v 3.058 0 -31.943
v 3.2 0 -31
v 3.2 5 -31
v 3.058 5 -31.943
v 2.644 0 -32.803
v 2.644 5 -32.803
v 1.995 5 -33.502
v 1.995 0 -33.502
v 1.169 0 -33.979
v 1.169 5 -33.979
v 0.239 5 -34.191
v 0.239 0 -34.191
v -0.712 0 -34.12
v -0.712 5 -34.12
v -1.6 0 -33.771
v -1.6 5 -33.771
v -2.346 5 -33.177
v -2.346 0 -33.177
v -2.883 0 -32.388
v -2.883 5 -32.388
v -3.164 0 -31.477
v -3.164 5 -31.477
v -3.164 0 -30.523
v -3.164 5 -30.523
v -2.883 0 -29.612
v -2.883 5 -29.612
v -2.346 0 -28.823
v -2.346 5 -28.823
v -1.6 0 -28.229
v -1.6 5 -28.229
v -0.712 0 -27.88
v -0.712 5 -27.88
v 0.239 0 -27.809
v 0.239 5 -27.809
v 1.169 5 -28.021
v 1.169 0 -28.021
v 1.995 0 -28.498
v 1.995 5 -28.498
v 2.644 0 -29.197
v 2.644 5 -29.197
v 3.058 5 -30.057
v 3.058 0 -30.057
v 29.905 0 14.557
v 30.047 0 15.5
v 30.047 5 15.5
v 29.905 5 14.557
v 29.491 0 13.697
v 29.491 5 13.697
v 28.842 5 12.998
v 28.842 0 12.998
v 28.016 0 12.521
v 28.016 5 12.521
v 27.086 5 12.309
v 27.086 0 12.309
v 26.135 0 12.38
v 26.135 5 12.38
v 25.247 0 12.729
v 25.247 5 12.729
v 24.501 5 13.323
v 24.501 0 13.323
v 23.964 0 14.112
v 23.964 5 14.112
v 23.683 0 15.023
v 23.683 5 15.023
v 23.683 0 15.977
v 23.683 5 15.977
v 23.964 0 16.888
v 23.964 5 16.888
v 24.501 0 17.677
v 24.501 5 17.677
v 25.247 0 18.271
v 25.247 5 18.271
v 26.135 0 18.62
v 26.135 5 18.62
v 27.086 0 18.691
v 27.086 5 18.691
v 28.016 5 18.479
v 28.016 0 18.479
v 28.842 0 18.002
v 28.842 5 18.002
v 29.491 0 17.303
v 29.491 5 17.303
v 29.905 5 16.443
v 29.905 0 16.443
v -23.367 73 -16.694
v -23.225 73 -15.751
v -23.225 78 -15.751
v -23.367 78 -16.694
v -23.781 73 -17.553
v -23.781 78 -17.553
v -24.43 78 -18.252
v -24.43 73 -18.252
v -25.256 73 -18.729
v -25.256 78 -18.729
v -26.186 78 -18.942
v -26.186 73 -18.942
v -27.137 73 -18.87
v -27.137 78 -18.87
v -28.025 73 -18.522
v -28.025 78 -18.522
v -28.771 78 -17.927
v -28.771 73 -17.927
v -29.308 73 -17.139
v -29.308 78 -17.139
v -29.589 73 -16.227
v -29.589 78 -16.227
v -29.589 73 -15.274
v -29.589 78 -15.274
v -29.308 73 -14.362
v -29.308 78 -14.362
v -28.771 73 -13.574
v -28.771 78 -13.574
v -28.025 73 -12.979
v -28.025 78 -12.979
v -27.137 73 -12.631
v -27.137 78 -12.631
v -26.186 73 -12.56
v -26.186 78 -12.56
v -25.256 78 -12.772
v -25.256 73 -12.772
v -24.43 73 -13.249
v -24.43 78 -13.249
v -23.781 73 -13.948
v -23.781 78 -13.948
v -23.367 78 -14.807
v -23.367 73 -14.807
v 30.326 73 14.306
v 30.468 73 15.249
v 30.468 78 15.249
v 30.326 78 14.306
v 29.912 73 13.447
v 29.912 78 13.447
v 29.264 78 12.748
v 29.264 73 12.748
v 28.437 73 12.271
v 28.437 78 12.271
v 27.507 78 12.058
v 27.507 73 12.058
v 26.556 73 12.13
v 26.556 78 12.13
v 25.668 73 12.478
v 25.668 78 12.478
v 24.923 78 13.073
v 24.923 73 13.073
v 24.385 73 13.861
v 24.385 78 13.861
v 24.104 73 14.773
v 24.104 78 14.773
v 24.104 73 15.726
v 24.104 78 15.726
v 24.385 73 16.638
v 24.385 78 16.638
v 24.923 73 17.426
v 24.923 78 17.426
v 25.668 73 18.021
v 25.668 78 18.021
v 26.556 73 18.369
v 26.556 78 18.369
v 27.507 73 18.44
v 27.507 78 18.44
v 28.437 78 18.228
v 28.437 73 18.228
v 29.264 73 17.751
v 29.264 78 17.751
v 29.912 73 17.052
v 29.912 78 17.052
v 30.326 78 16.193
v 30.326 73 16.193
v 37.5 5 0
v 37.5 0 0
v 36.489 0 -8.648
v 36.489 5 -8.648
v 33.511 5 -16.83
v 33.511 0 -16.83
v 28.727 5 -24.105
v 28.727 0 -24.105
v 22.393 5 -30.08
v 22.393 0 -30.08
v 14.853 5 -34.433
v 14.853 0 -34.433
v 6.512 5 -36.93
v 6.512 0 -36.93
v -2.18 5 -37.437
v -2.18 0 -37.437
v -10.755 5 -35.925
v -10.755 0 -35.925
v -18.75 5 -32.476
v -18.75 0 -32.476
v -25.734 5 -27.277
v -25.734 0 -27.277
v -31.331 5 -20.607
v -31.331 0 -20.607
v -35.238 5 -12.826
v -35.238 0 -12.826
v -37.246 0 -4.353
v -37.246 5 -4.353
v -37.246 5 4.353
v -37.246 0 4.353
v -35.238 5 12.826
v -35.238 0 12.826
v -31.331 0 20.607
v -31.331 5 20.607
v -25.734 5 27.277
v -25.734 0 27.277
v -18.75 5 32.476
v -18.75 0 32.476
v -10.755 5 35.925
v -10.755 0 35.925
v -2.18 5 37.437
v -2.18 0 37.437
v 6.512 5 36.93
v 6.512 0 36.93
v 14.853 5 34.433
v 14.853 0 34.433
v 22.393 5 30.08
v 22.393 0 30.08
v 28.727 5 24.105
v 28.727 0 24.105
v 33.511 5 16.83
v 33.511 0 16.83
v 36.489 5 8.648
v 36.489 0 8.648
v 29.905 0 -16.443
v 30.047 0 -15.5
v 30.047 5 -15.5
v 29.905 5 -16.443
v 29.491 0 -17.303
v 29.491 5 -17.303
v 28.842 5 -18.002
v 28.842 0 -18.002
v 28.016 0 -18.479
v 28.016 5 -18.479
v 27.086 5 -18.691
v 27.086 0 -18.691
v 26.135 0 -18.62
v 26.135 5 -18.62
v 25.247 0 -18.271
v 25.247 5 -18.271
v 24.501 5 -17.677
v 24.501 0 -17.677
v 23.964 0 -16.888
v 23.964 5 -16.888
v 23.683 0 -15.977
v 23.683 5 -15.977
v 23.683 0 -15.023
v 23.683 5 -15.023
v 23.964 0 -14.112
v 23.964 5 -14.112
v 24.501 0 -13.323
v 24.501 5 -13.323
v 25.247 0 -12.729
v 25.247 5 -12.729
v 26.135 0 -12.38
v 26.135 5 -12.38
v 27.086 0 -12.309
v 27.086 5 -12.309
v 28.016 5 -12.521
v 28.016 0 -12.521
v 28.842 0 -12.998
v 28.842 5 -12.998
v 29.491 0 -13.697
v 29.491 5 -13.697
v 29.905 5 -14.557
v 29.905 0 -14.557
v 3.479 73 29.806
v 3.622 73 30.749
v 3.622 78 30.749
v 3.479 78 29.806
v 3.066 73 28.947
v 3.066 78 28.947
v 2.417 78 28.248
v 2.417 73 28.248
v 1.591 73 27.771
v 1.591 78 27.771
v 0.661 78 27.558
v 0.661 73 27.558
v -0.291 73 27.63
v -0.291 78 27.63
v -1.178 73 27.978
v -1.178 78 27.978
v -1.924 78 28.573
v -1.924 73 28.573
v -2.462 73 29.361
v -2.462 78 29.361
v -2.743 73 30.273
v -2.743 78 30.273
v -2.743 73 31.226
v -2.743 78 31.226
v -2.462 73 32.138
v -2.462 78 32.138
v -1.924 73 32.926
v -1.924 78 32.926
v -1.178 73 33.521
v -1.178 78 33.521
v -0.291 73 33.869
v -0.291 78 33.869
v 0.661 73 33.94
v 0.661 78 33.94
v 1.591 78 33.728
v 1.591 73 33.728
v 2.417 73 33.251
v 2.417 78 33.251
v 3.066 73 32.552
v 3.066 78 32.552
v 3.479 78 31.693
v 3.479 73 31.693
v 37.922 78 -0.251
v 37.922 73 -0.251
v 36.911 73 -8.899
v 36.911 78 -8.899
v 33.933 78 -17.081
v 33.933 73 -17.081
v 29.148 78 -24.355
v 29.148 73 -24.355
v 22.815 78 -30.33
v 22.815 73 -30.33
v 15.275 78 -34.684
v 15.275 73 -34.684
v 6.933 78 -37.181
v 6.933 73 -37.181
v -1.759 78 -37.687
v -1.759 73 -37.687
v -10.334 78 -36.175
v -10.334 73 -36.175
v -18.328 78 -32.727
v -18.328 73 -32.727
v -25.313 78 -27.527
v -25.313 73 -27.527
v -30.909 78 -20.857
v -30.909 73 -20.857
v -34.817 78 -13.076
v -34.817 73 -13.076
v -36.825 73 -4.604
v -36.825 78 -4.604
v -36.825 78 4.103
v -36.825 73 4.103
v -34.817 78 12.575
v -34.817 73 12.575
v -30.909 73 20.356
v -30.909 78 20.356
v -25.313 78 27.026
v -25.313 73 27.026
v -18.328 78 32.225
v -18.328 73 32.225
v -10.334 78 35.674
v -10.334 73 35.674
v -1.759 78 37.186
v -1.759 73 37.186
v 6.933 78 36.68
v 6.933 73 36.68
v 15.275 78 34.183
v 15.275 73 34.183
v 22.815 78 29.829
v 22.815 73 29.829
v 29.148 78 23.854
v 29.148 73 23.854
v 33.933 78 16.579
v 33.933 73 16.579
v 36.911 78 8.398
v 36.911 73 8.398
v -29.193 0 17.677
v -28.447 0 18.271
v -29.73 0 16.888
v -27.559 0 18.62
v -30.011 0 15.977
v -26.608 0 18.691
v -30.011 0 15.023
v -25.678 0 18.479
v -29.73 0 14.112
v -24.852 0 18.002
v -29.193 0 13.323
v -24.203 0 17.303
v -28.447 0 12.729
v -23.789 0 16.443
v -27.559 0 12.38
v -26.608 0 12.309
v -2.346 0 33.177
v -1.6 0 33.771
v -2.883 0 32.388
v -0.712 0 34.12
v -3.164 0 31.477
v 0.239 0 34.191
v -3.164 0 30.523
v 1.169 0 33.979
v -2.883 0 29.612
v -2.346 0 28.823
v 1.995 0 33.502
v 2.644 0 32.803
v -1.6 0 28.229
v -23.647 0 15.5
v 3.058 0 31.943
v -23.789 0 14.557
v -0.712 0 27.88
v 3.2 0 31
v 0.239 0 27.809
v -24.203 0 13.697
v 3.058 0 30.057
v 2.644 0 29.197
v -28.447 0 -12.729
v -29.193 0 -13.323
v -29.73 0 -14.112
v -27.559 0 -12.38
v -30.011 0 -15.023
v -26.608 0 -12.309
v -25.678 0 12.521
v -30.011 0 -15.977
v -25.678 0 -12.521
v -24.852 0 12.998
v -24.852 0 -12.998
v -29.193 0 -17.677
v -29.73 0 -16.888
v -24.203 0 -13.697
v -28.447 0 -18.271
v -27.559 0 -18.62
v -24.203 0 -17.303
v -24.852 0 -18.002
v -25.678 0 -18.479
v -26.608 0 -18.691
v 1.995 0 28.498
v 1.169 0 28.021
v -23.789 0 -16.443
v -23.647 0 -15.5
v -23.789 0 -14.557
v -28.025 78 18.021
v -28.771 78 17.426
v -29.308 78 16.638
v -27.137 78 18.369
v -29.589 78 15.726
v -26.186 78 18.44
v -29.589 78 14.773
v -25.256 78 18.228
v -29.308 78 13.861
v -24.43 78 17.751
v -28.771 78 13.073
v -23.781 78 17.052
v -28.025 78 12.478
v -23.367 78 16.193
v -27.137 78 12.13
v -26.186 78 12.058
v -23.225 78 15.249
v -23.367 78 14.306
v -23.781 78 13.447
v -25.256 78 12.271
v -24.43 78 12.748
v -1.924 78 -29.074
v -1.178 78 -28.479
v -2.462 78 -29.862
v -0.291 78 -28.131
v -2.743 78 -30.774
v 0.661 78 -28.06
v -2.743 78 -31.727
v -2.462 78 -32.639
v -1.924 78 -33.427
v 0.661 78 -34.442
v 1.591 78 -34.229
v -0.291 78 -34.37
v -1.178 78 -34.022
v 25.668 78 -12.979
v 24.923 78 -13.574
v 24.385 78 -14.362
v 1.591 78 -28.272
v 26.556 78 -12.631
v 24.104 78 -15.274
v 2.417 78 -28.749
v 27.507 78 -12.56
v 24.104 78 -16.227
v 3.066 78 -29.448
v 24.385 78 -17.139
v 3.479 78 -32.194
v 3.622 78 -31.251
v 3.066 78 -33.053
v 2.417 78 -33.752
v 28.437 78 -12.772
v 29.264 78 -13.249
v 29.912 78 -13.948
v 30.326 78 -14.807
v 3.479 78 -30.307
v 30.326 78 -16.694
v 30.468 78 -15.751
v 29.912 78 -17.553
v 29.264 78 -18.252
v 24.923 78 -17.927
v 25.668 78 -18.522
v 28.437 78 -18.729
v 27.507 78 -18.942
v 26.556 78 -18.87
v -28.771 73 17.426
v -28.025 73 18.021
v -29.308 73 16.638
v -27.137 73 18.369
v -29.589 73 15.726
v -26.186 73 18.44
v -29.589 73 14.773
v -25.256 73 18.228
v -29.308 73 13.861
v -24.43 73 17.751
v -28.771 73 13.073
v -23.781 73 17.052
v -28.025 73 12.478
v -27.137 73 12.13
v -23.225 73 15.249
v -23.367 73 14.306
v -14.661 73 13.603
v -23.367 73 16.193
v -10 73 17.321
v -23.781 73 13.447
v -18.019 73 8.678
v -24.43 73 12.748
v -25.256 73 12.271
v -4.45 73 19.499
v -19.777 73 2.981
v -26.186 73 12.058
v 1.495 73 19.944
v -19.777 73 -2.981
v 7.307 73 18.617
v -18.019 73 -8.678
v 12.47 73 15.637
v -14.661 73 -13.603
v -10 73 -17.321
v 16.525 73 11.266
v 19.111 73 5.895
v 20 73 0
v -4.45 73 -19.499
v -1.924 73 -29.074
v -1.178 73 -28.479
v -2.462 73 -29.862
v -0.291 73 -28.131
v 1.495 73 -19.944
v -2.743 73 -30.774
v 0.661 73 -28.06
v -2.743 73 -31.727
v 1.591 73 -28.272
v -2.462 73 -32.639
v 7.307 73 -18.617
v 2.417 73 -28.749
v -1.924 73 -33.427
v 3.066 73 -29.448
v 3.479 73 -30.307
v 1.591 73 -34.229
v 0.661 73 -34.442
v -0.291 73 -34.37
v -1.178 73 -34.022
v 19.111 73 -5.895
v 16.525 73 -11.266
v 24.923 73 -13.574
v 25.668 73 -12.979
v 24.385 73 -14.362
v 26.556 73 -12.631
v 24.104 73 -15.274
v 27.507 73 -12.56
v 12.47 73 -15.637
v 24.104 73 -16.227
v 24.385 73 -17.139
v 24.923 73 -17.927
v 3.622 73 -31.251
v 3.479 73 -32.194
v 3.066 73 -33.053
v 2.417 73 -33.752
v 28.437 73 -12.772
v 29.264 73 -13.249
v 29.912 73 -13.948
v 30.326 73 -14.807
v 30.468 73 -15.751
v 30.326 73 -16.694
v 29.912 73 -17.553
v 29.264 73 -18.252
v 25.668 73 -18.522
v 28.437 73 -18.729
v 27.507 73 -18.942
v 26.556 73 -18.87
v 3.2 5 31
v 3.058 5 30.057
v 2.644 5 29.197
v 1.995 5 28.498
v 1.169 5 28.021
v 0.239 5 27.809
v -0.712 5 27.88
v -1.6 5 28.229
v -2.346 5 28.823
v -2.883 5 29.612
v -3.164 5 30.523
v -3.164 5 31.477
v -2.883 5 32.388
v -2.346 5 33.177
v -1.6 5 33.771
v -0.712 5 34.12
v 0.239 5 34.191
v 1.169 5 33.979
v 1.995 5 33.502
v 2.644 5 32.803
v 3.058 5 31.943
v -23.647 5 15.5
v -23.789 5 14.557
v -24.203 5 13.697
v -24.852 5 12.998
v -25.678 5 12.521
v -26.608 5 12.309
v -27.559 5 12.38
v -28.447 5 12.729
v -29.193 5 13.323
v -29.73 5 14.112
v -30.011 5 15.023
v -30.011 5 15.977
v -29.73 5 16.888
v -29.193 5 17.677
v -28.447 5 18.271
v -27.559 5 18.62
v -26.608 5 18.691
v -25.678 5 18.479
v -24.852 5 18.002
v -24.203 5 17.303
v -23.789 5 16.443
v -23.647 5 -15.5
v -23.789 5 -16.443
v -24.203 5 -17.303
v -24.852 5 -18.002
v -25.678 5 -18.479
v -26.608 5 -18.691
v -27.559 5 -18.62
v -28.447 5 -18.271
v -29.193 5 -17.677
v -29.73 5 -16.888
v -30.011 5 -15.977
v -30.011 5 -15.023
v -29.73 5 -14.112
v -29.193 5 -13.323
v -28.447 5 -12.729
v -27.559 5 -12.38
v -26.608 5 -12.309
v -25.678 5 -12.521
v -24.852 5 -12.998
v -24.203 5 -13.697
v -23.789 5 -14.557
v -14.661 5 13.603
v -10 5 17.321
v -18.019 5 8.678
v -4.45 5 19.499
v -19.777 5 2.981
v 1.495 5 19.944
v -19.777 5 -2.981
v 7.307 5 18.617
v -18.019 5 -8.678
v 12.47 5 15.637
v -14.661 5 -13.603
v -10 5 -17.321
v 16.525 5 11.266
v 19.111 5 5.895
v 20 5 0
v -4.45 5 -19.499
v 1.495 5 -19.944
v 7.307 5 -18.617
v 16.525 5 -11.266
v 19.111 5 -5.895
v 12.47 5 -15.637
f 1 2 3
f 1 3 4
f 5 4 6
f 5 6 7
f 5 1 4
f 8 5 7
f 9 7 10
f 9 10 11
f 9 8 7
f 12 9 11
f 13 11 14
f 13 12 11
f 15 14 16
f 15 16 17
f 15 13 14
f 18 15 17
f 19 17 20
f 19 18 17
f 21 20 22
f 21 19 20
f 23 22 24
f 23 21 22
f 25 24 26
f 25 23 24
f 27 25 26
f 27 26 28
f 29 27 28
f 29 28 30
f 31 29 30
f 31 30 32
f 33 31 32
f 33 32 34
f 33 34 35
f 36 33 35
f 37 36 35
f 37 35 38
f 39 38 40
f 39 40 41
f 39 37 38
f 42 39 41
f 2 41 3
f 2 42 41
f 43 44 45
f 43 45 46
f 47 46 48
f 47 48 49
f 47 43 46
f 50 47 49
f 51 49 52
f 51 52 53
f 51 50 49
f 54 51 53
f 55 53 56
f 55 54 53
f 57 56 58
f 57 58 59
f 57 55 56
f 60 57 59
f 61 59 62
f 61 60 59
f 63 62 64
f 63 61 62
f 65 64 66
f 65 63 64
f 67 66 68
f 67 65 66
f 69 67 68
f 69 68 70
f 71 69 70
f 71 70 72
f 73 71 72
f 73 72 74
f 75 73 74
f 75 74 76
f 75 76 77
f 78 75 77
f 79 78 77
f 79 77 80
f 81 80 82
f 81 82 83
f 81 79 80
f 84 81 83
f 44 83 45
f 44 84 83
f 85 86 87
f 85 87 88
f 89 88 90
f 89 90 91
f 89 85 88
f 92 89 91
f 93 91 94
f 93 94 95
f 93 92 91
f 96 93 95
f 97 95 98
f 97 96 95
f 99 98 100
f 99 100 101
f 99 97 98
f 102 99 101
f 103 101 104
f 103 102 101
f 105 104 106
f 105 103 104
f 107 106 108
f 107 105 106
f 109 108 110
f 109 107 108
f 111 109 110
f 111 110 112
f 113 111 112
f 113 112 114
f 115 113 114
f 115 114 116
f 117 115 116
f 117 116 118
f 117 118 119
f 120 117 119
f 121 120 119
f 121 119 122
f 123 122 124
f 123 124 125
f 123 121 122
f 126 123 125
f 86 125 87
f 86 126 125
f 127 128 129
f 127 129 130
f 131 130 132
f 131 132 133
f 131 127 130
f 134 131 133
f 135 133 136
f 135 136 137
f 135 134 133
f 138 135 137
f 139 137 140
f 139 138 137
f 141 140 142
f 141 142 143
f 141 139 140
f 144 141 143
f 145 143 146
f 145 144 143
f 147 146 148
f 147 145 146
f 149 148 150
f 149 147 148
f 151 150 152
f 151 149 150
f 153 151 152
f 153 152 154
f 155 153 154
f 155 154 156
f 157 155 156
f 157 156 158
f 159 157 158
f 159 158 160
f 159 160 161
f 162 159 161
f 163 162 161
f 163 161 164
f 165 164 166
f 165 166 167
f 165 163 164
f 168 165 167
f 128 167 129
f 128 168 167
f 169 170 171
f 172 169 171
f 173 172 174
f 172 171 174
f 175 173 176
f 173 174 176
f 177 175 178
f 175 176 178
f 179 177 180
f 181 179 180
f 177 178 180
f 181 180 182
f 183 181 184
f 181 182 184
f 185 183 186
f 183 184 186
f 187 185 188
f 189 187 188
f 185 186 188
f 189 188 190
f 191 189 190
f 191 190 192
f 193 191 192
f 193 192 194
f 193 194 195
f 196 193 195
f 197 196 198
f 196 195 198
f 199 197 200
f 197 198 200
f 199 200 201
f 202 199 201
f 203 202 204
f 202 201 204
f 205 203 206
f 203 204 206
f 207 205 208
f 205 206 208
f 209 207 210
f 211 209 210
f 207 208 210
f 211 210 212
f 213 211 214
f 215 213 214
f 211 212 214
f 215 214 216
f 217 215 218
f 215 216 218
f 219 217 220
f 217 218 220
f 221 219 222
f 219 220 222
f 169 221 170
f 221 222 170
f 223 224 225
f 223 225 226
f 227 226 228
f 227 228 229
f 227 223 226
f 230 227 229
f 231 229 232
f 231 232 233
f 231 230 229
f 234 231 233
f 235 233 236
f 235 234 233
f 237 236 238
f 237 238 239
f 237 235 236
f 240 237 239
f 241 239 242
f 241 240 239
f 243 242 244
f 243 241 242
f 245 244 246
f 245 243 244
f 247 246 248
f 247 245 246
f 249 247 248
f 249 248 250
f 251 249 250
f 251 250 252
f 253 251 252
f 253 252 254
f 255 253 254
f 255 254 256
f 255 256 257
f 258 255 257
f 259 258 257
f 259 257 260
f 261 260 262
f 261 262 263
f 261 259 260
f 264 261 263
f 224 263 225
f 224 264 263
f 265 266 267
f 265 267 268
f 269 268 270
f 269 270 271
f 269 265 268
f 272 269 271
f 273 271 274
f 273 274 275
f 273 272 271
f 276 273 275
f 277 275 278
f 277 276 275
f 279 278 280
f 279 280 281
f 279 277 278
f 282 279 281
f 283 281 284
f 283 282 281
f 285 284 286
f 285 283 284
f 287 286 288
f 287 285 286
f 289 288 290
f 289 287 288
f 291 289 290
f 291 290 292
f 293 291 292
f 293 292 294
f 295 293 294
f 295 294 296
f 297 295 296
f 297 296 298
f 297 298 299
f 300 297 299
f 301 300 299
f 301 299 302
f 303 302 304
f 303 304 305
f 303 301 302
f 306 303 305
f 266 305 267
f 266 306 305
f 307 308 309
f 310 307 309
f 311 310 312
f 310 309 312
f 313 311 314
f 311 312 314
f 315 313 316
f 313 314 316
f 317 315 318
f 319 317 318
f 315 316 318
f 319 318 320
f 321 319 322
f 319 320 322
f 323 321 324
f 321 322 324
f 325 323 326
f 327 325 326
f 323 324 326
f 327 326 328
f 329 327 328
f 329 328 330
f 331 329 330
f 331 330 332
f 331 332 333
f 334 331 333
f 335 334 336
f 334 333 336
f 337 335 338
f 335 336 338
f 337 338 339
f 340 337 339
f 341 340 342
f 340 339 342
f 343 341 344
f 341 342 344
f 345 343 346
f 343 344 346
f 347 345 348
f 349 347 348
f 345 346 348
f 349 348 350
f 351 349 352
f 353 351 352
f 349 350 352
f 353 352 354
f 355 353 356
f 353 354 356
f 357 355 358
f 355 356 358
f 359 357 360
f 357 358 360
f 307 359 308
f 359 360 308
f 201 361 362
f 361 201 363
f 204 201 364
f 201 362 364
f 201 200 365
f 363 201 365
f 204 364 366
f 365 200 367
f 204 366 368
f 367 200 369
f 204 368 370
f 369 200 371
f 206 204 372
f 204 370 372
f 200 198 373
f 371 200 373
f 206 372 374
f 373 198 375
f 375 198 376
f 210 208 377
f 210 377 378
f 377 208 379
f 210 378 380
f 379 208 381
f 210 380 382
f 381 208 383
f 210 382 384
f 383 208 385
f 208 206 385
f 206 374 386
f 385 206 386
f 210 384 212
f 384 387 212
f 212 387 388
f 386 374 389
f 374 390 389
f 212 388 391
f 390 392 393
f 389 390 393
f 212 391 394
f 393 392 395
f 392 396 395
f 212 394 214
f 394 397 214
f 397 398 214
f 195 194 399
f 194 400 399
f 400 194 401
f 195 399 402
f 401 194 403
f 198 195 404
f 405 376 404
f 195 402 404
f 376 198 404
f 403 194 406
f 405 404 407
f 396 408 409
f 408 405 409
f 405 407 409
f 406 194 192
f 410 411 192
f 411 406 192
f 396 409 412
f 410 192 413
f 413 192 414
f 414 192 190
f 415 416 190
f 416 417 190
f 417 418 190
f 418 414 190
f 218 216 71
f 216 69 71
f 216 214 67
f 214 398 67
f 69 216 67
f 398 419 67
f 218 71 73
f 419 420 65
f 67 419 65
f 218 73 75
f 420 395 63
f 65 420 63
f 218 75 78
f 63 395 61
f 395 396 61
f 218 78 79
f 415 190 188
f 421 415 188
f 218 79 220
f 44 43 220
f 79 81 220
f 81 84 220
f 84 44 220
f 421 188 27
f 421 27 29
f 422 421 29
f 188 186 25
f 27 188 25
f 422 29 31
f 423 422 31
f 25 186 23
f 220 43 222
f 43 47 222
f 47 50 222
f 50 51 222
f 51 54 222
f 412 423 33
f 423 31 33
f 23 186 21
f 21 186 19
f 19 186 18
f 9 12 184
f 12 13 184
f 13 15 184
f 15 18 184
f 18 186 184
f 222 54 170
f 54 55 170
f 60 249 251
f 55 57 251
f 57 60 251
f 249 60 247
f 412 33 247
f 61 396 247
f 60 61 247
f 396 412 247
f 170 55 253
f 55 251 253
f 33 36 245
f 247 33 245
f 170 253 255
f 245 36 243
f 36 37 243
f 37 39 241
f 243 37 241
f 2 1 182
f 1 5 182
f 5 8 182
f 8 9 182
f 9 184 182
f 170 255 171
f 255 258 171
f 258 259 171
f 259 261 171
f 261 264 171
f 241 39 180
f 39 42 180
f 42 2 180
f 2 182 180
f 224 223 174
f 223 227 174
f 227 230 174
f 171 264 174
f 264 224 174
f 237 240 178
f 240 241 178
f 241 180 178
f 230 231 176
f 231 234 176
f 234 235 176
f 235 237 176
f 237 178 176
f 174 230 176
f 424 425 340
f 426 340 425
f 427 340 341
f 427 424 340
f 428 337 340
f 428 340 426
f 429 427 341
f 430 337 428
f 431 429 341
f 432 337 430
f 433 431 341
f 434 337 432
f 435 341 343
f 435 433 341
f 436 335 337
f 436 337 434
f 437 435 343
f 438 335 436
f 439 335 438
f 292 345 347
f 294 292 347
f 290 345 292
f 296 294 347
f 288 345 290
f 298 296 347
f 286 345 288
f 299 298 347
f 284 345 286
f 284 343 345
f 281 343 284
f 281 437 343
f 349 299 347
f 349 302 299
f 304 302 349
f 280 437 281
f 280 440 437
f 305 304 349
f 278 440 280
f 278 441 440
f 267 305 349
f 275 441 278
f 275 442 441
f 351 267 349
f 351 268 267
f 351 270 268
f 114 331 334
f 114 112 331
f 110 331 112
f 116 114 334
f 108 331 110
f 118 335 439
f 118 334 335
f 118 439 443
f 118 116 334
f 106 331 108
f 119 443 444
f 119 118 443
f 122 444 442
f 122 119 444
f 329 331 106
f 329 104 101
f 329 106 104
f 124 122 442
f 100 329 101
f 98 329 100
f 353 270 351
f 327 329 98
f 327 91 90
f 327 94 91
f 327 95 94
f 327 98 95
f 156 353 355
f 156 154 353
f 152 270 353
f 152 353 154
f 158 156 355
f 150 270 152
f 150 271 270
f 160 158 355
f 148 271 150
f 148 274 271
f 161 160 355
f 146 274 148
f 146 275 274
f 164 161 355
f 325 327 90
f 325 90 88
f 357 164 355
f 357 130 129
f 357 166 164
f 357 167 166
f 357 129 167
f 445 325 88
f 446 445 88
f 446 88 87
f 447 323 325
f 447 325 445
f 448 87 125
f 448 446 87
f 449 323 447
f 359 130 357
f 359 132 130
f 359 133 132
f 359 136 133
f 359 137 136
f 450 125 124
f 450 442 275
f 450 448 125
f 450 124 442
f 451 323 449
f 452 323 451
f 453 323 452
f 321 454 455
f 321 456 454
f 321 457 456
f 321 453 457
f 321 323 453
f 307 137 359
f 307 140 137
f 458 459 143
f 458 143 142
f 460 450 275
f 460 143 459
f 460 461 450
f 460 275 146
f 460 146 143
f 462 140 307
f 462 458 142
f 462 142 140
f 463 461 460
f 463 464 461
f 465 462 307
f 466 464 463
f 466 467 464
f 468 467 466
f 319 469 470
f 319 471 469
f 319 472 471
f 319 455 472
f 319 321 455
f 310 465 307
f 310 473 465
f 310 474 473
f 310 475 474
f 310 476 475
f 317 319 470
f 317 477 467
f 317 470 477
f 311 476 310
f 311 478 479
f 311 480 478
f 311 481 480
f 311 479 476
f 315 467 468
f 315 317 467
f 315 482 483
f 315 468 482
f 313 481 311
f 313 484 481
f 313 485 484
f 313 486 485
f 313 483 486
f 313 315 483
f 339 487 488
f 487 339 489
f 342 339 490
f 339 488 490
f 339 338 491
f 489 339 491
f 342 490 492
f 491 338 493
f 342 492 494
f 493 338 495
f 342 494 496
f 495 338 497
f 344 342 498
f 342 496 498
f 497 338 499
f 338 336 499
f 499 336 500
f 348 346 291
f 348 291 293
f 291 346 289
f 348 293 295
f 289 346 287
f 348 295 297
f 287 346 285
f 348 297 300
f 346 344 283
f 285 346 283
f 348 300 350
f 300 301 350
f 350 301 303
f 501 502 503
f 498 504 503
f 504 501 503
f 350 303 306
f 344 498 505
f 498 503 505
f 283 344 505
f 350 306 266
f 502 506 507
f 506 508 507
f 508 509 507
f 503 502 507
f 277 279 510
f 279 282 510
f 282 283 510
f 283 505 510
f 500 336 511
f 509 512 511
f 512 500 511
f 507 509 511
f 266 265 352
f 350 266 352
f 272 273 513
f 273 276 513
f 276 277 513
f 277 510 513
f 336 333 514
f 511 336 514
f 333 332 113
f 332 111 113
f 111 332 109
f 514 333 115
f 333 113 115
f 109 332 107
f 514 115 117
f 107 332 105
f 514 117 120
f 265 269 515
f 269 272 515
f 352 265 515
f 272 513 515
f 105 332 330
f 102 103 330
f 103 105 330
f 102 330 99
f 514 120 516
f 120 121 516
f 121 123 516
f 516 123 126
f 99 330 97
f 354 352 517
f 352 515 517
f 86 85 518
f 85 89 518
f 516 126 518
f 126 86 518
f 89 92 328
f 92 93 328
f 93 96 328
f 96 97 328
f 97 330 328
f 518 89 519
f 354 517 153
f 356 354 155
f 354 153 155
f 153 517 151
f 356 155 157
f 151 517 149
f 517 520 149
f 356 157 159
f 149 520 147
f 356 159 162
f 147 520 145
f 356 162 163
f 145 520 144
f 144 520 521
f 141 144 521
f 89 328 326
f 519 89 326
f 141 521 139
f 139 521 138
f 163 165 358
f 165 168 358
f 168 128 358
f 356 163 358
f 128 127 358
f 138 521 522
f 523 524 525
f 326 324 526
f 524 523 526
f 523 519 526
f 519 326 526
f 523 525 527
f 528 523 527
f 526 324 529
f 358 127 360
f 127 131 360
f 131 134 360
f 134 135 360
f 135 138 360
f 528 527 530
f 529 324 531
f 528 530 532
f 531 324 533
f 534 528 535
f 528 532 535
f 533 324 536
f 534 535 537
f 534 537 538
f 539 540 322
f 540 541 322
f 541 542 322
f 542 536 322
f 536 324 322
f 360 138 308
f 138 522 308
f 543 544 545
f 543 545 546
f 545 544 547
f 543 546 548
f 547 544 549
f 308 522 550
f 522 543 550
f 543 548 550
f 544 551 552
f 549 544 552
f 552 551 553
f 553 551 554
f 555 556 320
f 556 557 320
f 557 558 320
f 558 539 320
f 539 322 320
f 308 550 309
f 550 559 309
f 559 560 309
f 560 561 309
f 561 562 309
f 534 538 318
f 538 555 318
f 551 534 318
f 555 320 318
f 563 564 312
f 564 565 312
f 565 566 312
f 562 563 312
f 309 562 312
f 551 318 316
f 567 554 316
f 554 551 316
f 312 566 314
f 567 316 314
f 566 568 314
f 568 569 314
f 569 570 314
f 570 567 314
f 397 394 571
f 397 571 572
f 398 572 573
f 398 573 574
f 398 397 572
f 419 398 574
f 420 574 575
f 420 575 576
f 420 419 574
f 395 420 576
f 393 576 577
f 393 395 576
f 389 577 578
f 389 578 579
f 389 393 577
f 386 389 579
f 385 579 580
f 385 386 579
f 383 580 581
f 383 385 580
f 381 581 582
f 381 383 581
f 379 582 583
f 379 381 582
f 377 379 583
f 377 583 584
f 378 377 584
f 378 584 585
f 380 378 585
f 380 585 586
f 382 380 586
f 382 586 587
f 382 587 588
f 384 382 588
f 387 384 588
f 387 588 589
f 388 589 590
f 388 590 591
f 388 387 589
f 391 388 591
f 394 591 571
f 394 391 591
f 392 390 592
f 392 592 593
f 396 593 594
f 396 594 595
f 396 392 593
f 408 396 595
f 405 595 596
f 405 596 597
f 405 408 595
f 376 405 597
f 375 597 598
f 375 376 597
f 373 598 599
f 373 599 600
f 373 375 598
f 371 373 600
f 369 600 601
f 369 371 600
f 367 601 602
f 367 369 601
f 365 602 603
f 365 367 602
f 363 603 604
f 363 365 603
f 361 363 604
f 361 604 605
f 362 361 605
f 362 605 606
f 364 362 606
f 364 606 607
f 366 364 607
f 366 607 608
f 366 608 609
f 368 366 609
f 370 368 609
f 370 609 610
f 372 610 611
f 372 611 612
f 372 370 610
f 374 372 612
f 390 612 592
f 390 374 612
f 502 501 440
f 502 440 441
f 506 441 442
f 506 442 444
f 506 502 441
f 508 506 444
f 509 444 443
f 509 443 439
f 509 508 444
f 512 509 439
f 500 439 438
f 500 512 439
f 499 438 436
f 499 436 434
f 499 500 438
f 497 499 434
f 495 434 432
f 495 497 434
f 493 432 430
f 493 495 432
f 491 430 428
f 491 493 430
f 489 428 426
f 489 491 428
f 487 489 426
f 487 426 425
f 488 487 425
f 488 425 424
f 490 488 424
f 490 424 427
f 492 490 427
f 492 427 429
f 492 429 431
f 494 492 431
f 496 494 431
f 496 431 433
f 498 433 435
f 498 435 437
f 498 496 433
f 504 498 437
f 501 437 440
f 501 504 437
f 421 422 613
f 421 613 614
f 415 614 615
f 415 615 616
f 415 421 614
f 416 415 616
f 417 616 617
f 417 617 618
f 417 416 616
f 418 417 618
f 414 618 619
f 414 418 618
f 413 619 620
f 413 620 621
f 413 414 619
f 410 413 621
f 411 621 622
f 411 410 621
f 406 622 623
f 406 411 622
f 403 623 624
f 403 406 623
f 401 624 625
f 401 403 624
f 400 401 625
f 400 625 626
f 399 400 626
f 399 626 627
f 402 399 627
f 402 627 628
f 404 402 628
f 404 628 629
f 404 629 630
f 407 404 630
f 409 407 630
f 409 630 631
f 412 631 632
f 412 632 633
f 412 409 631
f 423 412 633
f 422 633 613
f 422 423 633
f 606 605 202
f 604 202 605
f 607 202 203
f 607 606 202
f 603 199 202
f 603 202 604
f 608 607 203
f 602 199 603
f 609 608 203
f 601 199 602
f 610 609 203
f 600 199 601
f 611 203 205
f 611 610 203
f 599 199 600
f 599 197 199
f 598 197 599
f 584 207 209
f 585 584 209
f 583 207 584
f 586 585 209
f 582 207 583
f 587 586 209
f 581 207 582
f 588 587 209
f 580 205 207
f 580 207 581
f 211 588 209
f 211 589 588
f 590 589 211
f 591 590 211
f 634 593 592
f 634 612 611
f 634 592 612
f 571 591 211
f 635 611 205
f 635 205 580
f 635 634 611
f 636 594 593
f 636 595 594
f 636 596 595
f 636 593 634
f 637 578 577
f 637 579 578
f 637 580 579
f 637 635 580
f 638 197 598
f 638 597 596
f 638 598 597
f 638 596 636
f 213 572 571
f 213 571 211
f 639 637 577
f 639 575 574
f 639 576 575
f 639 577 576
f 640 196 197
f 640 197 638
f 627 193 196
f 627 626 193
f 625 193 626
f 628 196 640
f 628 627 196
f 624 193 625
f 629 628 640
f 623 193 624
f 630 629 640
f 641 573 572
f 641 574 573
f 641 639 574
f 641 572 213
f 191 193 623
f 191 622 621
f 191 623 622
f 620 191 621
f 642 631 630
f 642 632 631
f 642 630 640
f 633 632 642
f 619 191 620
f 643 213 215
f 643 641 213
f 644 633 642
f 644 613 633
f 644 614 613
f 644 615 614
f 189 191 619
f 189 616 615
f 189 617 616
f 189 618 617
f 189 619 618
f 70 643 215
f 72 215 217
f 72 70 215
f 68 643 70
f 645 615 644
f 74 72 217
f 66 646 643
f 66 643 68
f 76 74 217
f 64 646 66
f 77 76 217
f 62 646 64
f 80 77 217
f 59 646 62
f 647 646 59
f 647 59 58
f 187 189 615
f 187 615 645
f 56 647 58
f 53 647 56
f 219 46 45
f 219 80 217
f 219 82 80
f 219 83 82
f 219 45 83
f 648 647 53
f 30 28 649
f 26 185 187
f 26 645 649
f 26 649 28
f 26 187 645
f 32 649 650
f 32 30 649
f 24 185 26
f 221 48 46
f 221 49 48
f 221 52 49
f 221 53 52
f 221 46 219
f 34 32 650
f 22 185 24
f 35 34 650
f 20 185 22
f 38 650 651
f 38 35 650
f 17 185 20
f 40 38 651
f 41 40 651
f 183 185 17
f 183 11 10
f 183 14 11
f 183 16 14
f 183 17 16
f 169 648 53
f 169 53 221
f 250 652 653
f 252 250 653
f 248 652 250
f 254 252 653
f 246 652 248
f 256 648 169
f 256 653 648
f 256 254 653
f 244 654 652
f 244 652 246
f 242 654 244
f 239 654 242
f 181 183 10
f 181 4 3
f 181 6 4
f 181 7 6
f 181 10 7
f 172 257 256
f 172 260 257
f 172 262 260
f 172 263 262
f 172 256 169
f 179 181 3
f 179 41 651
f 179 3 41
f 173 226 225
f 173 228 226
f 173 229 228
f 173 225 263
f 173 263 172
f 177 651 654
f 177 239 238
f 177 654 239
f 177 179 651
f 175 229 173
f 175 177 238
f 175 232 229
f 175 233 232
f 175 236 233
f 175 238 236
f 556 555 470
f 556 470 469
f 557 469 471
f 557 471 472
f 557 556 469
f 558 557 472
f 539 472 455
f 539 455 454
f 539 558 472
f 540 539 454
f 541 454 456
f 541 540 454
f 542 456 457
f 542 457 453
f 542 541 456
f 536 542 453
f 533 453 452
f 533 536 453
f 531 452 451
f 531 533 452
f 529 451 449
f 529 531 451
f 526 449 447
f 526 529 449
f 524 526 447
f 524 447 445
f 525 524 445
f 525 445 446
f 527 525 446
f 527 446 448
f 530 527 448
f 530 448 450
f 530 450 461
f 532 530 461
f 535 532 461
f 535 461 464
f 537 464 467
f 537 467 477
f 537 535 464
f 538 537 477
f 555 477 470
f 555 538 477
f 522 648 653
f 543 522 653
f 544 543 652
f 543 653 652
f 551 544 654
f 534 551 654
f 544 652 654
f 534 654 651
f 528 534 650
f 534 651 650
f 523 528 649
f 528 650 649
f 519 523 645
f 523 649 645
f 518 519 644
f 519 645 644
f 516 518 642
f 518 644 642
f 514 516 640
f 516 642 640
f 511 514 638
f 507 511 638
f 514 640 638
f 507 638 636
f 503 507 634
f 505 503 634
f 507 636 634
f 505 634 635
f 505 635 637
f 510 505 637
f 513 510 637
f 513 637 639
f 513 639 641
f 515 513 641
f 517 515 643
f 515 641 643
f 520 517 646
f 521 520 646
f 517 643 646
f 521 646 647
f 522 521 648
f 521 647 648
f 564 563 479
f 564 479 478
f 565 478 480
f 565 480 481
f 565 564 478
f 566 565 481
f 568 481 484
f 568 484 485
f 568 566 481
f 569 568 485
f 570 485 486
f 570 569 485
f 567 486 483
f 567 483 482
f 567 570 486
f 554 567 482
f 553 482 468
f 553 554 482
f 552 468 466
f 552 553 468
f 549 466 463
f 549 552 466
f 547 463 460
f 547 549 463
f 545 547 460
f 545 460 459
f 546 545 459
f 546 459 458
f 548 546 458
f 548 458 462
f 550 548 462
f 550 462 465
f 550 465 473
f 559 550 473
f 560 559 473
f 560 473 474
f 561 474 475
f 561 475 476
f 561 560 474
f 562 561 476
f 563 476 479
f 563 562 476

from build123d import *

# Parameters (mm, degrees)
SKETCH1_R           = 37.5
SKETCH1_R_2         = 3.2
BOSS_EXTRUDE1_DEPTH = 5
SKETCH2_R           = 20
BOSS_EXTRUDE2_DEPTH = 68
SKETCH5_R           = 37.5
SKETCH5_R_2         = 3.2
BOSS_EXTRUDE3_DEPTH = 5


with BuildPart() as part:
    # Sketch1 → Boss-Extrude1 (new body)
    with BuildSketch(Plane(origin=(0, 0, 0), x_dir=(1, 0, 0), z_dir=(0, 1, 0))):
        Circle(SKETCH1_R)
        with Locations((0, 31)):
            Circle(SKETCH1_R_2, mode=Mode.SUBTRACT)
        with Locations((26.846787517, 15.5)):
            Circle(SKETCH1_R_2, mode=Mode.SUBTRACT)
        with Locations((26.846787517, -15.5)):
            Circle(SKETCH1_R_2, mode=Mode.SUBTRACT)
        with Locations((0, -31)):
            Circle(SKETCH1_R_2, mode=Mode.SUBTRACT)
        with Locations((-26.846787517, -15.5)):
            Circle(SKETCH1_R_2, mode=Mode.SUBTRACT)
        with Locations((-26.846787517, 15.5)):
            Circle(SKETCH1_R_2, mode=Mode.SUBTRACT)
    extrude(amount=BOSS_EXTRUDE1_DEPTH)

    # Sketch2 → Boss-Extrude2 (add)
    with BuildSketch(Plane(origin=(0, 5, 0), x_dir=(1, 0, 0), z_dir=(0, 1, 0))):
        Circle(SKETCH2_R)
    extrude(amount=BOSS_EXTRUDE2_DEPTH)

    # Sketch5 → Boss-Extrude3 (add)
    with BuildSketch(Plane(origin=(0, 73, 0), x_dir=(1, 0, 0), z_dir=(0, 1, 0))):
        with Locations((0.421553843, 0.250555935)):
            Circle(SKETCH5_R)
        with Locations((0.421553843, 31.250555935)):
            Circle(SKETCH5_R_2, mode=Mode.SUBTRACT)
        with Locations((27.268341361, 15.750555935)):
            Circle(SKETCH5_R_2, mode=Mode.SUBTRACT)
        with Locations((27.268341361, -15.249444065)):
            Circle(SKETCH5_R_2, mode=Mode.SUBTRACT)
        with Locations((0.421553843, -30.749444065)):
            Circle(SKETCH5_R_2, mode=Mode.SUBTRACT)
        with Locations((-26.425233674, -15.249444065)):
            Circle(SKETCH5_R_2, mode=Mode.SUBTRACT)
        with Locations((-26.425233674, 15.750555935)):
            Circle(SKETCH5_R_2, mode=Mode.SUBTRACT)
    extrude(amount=BOSS_EXTRUDE3_DEPTH)


solid = part.part
